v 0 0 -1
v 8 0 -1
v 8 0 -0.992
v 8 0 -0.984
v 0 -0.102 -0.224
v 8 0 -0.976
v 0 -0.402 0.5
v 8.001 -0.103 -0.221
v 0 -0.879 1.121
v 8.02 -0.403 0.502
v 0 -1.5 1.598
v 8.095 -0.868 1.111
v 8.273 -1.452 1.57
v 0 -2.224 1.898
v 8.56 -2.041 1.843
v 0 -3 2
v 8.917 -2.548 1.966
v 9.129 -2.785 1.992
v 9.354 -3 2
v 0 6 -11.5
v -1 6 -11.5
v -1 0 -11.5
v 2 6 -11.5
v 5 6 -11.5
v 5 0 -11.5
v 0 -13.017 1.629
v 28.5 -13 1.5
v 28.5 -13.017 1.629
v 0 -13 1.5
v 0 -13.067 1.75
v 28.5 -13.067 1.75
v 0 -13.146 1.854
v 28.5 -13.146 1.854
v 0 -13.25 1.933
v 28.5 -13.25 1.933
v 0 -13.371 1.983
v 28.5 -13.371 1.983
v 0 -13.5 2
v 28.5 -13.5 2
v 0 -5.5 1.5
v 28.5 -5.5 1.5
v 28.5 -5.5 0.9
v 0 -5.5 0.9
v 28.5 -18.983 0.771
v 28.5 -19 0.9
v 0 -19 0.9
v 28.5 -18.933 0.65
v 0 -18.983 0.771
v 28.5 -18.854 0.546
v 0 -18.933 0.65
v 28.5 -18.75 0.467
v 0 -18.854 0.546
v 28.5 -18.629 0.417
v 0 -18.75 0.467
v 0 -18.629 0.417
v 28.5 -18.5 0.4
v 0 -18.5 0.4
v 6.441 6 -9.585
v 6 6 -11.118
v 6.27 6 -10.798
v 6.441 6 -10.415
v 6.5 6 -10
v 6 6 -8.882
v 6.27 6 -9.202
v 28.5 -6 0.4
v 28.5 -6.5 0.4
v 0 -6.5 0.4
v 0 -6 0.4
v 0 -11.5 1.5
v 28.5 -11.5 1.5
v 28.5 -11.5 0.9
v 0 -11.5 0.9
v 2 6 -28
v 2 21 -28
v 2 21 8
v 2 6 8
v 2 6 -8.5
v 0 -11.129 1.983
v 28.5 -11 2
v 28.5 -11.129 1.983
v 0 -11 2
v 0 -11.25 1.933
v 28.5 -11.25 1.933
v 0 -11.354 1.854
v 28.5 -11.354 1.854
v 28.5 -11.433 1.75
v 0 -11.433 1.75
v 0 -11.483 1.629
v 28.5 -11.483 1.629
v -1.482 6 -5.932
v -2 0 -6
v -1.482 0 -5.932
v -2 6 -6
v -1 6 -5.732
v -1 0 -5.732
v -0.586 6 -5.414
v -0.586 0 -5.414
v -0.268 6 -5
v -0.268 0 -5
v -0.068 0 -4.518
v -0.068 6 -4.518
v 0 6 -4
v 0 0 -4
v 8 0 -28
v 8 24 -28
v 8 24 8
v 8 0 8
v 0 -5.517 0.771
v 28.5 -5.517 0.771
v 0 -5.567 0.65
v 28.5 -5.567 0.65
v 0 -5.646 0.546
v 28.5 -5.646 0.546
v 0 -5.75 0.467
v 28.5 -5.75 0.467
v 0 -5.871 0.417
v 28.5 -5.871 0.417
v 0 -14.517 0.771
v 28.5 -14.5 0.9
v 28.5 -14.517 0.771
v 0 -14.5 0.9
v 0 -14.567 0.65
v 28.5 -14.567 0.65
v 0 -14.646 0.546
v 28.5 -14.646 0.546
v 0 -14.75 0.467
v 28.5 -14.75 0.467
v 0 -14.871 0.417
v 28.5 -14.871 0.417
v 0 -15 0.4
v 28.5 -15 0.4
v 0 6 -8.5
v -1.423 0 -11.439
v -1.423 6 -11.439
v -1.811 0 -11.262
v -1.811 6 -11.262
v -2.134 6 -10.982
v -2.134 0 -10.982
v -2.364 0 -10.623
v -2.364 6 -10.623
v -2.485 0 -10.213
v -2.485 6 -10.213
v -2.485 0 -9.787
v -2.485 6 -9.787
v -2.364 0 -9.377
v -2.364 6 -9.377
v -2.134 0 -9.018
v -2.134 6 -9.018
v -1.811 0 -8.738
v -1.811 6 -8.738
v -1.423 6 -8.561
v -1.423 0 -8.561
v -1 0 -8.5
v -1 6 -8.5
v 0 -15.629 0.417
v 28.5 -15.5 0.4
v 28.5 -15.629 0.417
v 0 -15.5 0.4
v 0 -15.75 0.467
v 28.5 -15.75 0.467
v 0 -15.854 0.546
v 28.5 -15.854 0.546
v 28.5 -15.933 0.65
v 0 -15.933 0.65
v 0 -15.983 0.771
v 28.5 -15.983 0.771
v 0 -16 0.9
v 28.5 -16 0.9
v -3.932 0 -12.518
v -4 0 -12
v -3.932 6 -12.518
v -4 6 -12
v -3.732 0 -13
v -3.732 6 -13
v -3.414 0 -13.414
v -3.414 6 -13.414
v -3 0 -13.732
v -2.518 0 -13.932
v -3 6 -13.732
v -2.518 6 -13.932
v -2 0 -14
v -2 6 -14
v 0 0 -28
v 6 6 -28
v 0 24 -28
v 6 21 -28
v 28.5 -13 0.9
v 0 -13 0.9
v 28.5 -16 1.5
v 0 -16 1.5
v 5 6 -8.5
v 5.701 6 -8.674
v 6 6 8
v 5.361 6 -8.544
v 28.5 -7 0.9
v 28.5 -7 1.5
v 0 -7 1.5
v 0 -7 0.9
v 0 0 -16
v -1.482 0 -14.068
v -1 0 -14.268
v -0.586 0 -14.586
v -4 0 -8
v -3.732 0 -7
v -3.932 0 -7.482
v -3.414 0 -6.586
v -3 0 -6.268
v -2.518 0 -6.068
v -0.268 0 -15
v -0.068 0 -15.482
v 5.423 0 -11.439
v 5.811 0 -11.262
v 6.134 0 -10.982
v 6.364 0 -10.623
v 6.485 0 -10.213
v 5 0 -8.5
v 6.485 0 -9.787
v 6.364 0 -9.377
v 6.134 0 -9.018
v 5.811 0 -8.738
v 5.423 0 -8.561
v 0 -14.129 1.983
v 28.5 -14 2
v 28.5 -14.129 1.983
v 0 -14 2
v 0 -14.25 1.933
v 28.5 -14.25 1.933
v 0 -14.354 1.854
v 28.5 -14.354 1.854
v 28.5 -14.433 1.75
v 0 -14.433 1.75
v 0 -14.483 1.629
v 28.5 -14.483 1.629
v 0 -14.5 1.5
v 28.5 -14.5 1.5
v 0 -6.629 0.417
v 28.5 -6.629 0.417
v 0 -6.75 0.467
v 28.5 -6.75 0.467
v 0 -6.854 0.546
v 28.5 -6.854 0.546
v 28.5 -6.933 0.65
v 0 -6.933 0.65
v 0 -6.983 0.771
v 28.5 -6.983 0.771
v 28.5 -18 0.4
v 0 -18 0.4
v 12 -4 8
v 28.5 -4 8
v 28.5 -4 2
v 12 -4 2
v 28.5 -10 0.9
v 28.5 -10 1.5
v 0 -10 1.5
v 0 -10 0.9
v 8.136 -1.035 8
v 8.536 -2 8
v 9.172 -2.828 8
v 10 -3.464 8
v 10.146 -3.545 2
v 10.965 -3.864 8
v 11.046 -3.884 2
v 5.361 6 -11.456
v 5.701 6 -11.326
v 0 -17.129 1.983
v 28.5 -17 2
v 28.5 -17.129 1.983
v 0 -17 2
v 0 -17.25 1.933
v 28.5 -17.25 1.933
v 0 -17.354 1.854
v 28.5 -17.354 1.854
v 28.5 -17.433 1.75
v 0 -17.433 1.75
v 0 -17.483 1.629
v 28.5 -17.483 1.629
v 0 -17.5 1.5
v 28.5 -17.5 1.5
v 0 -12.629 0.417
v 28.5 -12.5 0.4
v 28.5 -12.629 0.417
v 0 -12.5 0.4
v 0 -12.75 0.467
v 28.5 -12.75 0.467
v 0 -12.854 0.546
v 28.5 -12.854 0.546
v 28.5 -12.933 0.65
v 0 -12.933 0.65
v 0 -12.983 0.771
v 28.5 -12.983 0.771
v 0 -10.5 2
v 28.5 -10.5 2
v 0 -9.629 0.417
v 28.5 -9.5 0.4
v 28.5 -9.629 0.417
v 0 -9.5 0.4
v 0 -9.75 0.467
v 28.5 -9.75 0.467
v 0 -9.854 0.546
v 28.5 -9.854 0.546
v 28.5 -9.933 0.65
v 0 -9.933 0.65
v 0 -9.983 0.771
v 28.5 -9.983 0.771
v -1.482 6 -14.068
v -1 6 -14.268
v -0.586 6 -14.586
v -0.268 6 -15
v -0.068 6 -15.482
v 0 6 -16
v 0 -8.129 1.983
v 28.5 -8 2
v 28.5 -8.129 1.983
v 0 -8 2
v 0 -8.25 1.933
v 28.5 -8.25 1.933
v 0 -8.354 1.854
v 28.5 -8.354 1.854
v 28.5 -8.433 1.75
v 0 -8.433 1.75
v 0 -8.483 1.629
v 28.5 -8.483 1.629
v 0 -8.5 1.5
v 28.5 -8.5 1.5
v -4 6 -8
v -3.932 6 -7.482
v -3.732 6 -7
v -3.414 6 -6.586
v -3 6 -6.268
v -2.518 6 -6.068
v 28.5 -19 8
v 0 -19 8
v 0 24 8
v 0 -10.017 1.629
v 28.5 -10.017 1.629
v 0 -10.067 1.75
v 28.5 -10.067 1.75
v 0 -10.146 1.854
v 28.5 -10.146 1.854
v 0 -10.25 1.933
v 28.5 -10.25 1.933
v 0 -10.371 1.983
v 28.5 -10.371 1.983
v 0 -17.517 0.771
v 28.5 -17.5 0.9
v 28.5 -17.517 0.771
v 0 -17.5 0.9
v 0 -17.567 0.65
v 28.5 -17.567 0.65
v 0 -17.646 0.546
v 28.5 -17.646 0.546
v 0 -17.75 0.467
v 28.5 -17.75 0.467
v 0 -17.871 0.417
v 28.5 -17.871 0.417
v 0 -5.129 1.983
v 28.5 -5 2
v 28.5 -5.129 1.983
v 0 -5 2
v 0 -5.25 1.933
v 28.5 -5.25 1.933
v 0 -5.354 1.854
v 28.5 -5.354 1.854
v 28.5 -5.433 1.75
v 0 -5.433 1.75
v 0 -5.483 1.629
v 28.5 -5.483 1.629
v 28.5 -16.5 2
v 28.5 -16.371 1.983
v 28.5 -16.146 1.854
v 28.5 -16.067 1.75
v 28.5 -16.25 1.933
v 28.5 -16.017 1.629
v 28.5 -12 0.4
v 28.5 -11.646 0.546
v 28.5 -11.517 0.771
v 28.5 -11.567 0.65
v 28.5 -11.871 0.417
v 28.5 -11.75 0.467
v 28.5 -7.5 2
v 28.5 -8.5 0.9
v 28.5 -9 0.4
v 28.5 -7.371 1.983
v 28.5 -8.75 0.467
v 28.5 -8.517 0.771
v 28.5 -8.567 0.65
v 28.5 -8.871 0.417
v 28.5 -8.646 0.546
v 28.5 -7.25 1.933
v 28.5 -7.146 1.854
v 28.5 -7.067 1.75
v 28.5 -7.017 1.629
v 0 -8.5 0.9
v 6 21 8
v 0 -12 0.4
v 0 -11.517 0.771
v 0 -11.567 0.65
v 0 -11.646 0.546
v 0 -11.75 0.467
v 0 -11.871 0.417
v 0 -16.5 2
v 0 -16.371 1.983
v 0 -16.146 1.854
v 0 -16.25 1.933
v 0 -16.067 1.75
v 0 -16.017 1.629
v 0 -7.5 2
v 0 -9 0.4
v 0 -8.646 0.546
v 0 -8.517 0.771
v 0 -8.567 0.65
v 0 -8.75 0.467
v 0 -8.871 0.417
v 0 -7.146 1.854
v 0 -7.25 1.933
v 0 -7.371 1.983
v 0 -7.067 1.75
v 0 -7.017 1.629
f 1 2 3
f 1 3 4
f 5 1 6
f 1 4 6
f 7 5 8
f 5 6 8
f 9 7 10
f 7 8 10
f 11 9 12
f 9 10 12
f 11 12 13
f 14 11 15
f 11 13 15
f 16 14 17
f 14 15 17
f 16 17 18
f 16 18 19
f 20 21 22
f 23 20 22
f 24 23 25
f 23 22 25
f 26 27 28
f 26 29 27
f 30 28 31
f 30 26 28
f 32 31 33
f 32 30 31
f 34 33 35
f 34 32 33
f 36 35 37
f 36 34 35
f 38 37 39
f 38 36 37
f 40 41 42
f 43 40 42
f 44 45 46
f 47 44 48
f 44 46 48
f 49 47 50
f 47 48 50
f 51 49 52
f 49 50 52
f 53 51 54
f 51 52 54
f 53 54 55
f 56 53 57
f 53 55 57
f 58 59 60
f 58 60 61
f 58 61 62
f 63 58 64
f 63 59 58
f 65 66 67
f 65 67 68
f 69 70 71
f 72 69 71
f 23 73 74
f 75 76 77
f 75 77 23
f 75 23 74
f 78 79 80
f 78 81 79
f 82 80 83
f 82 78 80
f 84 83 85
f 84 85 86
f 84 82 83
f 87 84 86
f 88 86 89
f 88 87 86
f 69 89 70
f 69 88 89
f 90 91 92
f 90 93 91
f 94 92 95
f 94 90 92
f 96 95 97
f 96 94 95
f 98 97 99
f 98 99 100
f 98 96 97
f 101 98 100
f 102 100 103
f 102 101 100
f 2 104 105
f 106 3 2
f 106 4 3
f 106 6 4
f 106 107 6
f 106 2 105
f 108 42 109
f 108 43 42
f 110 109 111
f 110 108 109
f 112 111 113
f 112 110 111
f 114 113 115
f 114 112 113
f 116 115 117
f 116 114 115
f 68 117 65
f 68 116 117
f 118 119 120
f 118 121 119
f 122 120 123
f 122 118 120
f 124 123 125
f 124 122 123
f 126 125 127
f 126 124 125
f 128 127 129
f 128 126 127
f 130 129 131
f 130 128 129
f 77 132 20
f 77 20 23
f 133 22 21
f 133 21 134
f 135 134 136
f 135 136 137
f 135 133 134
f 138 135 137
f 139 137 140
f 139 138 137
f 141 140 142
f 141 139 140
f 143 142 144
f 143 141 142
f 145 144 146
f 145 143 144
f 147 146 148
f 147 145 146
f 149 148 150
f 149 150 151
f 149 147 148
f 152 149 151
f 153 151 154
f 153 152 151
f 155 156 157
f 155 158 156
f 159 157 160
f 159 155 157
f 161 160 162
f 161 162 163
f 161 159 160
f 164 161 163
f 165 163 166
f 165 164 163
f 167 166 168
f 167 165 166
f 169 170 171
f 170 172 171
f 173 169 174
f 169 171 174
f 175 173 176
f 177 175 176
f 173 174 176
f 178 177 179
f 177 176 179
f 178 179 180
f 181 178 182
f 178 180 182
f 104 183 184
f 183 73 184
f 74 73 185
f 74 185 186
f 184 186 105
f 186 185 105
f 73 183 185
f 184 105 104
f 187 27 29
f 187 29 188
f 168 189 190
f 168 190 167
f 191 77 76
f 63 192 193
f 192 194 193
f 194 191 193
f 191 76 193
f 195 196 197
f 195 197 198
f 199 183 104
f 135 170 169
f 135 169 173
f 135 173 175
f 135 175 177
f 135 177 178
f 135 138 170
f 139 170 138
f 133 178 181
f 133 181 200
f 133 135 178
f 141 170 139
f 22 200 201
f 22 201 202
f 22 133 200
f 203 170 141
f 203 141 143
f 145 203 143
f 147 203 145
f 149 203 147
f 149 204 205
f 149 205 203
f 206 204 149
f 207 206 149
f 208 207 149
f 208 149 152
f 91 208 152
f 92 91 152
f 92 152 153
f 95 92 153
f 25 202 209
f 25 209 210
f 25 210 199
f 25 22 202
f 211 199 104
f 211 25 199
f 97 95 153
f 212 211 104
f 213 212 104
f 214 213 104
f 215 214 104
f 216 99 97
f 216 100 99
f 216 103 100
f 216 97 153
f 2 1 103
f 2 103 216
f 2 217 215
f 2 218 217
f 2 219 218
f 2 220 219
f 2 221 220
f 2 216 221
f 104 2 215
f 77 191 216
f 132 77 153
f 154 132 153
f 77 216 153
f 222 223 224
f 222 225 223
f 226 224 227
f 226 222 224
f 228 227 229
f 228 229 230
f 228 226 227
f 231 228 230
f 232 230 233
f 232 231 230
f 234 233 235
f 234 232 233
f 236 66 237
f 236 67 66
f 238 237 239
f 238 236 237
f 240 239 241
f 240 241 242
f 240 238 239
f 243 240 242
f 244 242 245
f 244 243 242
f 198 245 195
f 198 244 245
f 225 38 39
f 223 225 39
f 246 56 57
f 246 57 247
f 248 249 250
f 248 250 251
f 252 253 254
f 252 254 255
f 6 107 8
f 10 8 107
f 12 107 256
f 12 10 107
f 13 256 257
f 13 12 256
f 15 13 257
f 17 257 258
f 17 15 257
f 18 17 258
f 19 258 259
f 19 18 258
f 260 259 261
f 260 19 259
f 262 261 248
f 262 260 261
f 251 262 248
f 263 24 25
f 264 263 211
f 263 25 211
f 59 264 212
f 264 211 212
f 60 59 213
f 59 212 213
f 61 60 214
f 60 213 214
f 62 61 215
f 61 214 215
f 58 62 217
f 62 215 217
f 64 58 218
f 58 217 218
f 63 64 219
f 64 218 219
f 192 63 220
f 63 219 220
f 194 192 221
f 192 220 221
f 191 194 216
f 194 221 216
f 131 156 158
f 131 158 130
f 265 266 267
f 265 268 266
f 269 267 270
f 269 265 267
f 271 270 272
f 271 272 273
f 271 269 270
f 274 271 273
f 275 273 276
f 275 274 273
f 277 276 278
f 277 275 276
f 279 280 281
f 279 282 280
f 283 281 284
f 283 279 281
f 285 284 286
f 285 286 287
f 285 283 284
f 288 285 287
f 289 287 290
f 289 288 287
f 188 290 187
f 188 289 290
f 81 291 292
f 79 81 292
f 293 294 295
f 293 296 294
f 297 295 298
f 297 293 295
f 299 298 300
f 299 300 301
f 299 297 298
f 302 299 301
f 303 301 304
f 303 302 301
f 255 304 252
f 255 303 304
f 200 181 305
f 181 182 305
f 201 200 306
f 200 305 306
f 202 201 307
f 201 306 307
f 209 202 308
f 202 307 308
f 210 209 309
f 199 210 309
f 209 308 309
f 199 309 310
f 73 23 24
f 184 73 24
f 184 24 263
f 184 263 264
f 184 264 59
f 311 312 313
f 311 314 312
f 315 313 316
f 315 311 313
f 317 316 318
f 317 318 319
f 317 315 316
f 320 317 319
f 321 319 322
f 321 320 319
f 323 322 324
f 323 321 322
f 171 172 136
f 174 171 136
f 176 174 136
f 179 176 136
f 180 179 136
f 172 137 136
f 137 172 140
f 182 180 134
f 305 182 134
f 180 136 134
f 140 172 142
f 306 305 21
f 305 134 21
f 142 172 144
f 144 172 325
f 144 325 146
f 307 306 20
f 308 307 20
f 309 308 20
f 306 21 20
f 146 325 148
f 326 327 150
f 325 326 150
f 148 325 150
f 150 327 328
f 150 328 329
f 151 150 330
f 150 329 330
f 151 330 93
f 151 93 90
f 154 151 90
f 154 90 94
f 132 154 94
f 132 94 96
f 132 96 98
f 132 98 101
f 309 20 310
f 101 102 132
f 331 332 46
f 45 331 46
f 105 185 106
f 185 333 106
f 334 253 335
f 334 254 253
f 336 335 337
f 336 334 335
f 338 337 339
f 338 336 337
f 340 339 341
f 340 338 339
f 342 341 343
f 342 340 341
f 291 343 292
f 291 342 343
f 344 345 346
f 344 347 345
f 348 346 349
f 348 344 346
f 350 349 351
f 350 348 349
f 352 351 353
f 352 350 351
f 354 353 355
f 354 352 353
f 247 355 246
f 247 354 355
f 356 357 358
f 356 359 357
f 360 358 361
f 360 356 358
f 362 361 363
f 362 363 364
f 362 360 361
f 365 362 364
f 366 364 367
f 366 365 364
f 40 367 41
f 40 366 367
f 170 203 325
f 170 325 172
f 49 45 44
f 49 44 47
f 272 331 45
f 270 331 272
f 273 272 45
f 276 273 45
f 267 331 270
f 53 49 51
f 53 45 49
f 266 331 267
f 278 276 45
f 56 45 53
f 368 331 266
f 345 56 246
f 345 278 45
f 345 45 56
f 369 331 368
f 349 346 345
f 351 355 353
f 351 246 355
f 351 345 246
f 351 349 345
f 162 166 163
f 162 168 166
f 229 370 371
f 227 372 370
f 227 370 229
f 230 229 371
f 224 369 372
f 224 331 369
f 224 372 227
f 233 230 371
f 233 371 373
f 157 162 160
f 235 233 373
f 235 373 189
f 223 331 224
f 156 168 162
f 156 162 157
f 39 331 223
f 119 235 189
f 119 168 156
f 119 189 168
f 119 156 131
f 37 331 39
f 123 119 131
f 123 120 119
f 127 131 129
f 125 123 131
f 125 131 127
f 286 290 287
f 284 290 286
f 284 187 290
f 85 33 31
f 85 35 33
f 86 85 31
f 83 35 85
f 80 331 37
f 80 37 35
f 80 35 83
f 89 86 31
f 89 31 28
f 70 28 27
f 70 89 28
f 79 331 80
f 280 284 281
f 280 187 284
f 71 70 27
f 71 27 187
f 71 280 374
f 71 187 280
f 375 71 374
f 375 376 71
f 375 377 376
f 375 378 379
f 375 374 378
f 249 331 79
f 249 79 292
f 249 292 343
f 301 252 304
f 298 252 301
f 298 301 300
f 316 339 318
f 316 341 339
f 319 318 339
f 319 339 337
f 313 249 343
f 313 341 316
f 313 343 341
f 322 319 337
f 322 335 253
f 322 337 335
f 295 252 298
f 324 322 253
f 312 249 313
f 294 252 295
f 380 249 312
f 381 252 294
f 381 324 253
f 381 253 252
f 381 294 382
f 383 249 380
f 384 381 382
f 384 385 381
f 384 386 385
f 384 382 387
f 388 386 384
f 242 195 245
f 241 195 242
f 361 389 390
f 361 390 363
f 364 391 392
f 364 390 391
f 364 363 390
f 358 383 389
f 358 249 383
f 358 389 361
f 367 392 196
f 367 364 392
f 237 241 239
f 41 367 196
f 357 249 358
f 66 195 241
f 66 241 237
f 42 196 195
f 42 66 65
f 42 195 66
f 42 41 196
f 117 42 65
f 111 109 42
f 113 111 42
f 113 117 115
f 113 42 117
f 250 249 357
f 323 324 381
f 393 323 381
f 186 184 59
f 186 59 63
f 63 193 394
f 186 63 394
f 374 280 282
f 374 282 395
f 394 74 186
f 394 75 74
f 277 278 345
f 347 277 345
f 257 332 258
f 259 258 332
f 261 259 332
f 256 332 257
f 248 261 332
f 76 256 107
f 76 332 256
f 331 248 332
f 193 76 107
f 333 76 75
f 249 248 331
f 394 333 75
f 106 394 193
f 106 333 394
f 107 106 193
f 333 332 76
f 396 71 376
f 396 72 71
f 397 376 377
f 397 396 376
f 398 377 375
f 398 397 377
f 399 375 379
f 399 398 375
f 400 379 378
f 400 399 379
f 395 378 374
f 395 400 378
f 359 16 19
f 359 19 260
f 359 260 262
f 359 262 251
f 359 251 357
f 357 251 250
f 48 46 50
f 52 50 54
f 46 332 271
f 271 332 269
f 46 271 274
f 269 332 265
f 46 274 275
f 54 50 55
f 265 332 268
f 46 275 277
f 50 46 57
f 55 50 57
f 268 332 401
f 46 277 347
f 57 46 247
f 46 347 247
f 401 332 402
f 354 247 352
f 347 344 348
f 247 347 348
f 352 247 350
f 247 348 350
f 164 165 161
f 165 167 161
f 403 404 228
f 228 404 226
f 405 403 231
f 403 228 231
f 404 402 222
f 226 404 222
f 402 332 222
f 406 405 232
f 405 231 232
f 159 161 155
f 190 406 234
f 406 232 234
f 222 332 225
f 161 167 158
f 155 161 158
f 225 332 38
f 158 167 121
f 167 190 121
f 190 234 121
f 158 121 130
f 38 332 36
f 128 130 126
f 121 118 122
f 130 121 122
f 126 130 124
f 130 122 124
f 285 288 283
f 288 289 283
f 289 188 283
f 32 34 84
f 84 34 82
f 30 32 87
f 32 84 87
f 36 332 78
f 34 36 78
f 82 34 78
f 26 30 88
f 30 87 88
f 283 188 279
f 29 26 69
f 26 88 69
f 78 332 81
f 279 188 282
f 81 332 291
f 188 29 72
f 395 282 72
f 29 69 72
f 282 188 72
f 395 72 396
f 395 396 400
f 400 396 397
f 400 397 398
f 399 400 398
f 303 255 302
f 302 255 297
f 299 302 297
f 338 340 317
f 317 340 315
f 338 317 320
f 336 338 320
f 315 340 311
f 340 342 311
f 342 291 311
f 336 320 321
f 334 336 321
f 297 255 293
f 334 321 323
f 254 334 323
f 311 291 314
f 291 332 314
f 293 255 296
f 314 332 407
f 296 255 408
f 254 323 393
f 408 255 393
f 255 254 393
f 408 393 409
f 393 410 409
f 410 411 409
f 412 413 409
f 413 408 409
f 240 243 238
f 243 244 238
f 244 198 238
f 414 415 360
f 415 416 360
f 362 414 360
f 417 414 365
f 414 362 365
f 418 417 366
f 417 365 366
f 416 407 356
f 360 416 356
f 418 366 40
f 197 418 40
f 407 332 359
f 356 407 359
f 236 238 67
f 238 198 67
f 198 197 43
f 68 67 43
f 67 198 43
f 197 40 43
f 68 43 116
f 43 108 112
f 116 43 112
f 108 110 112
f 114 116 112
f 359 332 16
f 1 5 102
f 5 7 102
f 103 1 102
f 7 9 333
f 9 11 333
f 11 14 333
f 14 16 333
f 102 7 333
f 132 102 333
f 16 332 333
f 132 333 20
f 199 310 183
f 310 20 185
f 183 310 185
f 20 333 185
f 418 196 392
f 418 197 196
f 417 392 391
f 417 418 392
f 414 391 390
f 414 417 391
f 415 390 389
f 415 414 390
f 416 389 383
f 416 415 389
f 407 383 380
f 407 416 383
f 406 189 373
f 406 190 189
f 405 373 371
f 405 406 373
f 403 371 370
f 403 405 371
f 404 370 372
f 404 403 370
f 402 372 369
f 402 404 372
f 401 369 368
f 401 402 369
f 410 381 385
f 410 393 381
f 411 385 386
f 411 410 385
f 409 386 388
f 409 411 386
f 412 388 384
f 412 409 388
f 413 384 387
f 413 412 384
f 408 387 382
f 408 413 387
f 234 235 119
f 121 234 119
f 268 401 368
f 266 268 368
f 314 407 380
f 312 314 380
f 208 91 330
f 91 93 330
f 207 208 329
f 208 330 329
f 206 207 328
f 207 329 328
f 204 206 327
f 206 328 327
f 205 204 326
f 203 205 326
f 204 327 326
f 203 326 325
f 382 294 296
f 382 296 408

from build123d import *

# Parameters (mm, degrees)
SKETCH_1_W          = 8
SKETCH_1_H          = 24
SKETCH_1_W_2        = 4
SKETCH_1_H_2        = 15
EXTRUDE_1_DEPTH     = 8
SKETCH_1_3_W        = 8
SKETCH_1_3_H        = 24
SKETCH_1_3_W_2      = 4
SKETCH_1_3_H_2      = 15
EXTRUDE_2_DEPTH     = 28
EXTRUDE_4_DEPTH     = 6
CUT_EXTRUDE_2_DEPTH = 6
SKETCH_4_W          = 8
SKETCH_4_H          = 4
EXTRUDE_5_DEPTH     = 6
FILLET_1_R          = 2
FILLET_2_R          = 3
FILLET_3_R          = 4
SKETCH_6_W          = 1.6
SKETCH_6_H          = 1.5
EXTRUDE_7_DEPTH     = 28.5
FILLET_5_R          = 0.5


with BuildPart() as part:
    # Эскиз1 → Бобышка-Вытянуть1 (new body)
    with BuildSketch(Plane.XY):
        with Locations((4, 12)):
            Rectangle(SKETCH_1_W, SKETCH_1_H)
        with Locations((4, 13.5)):
            Rectangle(SKETCH_1_W_2, SKETCH_1_H_2, mode=Mode.SUBTRACT)
    extrude(amount=EXTRUDE_1_DEPTH)

    # Эскиз1<3> → Бобышка-Вытянуть2 (add)
    with BuildSketch(Plane.XY):
        with Locations((4, 12)):
            Rectangle(SKETCH_1_3_W, SKETCH_1_3_H)
        with Locations((4, 13.5)):
            Rectangle(SKETCH_1_3_W_2, SKETCH_1_3_H_2, mode=Mode.SUBTRACT)
    extrude(amount=-EXTRUDE_2_DEPTH)

    # Эскиз3 → Бобышка-Вытянуть4 (add)
    with BuildSketch(Plane.XZ):
        with BuildLine():
            Line((0, -14), (0, -11.5))
            Line((0, -11.5), (-1, -11.5))
            ThreePointArc((-1, -11.5), (-2.5, -10), (-1, -8.5))
            Line((-1, -8.5), (0, -8.5))
            Line((0, -8.5), (0, -6))
            Line((0, -6), (-4, -6))
            Line((-4, -6), (-4, -14))
            Line((-4, -14), (0, -14))
        make_face()
    extrude(amount=-EXTRUDE_4_DEPTH)

    # Эскиз3<3> → Вырез-Вытянуть2 (cut)
    with BuildSketch(Plane.XZ):
        with BuildLine():
            Line((-1, -11.5), (0, -11.5))
            Line((0, -11.5), (0, -8.5))
            Line((0, -8.5), (-1, -8.5))
            ThreePointArc((-1, -8.5), (-2.5, -10), (-1, -11.5))
        make_face()
        with BuildLine():
            Line((0, -11.5), (5, -11.5))
            ThreePointArc((5, -11.5), (6.5, -10), (5, -8.5))
            Line((5, -8.5), (0, -8.5))
            Line((0, -8.5), (0, -11.5))
        make_face()
    extrude(amount=-CUT_EXTRUDE_2_DEPTH, mode=Mode.SUBTRACT)

    # Эскиз4 → Бобышка-Вытянуть5 (add)
    with BuildSketch(Plane.XY.offset(8)):
        Polygon((8, -4), (0, -4), (0, -19), (28.5, -19), (28.5, -4), align=None)
        with Locations((4, -2)):
            Rectangle(SKETCH_4_W, SKETCH_4_H)
    extrude(amount=-EXTRUDE_5_DEPTH)

    # Скругление1
    fillet_1_edges = [part.edges().sort_by_distance(p)[0] for p in [
        (0, 3, -14),
        (0, 3, -6),
    ]]
    fillet(fillet_1_edges, radius=FILLET_1_R)
    fillet_1_2_edges = [part.edges().sort_by_distance(p)[0] for p in [
        (-4, 3, -14),
        (-4, 3, -6),
    ]]
    fillet(fillet_1_2_edges, radius=FILLET_1_R - 0.0001)  # a hair under: the kernel refuses the full size

    # Скругление2
    fillet_2_edges = [part.edges().sort_by_distance(p)[0] for p in [
        (4, 0, 2),
    ]]
    fillet(fillet_2_edges, radius=FILLET_2_R)

    # Скругление3
    fillet_3_edges = [part.edges().sort_by_distance(p)[0] for p in [
        (8, -4, 5),
    ]]
    fillet(fillet_3_edges, radius=FILLET_3_R - 0.0001)  # a hair under: the kernel refuses the full size

    # Эскиз6 → Бобышка-Вытянуть7 (add)
    with BuildSketch(Plane(origin=(28.5, 0, 0), x_dir=(0, 0, -1), z_dir=(1, 0, 0))):
        with Locations((-1.2, -15.25)):
            Rectangle(SKETCH_6_W, SKETCH_6_H)
        with Locations((-1.2, -18.25)):
            Rectangle(SKETCH_6_W, SKETCH_6_H)
        with Locations((-1.2, -12.25)):
            Rectangle(SKETCH_6_W, SKETCH_6_H)
        with Locations((-1.2, -9.25)):
            Rectangle(SKETCH_6_W, SKETCH_6_H)
        with Locations((-1.2, -6.25)):
            Rectangle(SKETCH_6_W, SKETCH_6_H)
    extrude(amount=-EXTRUDE_7_DEPTH)

    # Скругление5
    fillet_5_edges = [part.edges().sort_by_distance(p)[0] for p in [
        (14.25, -19, 0.4),
        (14.25, -17.5, 0.4),
        (14.25, -17.5, 2),
        (14.25, -14.5, 0.4),
        (14.25, -14.5, 2),
        (14.25, -16, 2),
        (14.25, -16, 0.4),
        (14.25, -11.5, 0.4),
        (14.25, -11.5, 2),
        (14.25, -13, 2),
        (14.25, -13, 0.4),
        (14.25, -8.5, 0.4),
        (14.25, -8.5, 2),
        (14.25, -10, 2),
        (14.25, -10, 0.4),
        (14.25, -5.5, 0.4),
        (14.25, -5.5, 2),
        (14.25, -7, 2),
        (14.25, -7, 0.4),
    ]]
    fillet(fillet_5_edges, radius=FILLET_5_R)


solid = part.part
